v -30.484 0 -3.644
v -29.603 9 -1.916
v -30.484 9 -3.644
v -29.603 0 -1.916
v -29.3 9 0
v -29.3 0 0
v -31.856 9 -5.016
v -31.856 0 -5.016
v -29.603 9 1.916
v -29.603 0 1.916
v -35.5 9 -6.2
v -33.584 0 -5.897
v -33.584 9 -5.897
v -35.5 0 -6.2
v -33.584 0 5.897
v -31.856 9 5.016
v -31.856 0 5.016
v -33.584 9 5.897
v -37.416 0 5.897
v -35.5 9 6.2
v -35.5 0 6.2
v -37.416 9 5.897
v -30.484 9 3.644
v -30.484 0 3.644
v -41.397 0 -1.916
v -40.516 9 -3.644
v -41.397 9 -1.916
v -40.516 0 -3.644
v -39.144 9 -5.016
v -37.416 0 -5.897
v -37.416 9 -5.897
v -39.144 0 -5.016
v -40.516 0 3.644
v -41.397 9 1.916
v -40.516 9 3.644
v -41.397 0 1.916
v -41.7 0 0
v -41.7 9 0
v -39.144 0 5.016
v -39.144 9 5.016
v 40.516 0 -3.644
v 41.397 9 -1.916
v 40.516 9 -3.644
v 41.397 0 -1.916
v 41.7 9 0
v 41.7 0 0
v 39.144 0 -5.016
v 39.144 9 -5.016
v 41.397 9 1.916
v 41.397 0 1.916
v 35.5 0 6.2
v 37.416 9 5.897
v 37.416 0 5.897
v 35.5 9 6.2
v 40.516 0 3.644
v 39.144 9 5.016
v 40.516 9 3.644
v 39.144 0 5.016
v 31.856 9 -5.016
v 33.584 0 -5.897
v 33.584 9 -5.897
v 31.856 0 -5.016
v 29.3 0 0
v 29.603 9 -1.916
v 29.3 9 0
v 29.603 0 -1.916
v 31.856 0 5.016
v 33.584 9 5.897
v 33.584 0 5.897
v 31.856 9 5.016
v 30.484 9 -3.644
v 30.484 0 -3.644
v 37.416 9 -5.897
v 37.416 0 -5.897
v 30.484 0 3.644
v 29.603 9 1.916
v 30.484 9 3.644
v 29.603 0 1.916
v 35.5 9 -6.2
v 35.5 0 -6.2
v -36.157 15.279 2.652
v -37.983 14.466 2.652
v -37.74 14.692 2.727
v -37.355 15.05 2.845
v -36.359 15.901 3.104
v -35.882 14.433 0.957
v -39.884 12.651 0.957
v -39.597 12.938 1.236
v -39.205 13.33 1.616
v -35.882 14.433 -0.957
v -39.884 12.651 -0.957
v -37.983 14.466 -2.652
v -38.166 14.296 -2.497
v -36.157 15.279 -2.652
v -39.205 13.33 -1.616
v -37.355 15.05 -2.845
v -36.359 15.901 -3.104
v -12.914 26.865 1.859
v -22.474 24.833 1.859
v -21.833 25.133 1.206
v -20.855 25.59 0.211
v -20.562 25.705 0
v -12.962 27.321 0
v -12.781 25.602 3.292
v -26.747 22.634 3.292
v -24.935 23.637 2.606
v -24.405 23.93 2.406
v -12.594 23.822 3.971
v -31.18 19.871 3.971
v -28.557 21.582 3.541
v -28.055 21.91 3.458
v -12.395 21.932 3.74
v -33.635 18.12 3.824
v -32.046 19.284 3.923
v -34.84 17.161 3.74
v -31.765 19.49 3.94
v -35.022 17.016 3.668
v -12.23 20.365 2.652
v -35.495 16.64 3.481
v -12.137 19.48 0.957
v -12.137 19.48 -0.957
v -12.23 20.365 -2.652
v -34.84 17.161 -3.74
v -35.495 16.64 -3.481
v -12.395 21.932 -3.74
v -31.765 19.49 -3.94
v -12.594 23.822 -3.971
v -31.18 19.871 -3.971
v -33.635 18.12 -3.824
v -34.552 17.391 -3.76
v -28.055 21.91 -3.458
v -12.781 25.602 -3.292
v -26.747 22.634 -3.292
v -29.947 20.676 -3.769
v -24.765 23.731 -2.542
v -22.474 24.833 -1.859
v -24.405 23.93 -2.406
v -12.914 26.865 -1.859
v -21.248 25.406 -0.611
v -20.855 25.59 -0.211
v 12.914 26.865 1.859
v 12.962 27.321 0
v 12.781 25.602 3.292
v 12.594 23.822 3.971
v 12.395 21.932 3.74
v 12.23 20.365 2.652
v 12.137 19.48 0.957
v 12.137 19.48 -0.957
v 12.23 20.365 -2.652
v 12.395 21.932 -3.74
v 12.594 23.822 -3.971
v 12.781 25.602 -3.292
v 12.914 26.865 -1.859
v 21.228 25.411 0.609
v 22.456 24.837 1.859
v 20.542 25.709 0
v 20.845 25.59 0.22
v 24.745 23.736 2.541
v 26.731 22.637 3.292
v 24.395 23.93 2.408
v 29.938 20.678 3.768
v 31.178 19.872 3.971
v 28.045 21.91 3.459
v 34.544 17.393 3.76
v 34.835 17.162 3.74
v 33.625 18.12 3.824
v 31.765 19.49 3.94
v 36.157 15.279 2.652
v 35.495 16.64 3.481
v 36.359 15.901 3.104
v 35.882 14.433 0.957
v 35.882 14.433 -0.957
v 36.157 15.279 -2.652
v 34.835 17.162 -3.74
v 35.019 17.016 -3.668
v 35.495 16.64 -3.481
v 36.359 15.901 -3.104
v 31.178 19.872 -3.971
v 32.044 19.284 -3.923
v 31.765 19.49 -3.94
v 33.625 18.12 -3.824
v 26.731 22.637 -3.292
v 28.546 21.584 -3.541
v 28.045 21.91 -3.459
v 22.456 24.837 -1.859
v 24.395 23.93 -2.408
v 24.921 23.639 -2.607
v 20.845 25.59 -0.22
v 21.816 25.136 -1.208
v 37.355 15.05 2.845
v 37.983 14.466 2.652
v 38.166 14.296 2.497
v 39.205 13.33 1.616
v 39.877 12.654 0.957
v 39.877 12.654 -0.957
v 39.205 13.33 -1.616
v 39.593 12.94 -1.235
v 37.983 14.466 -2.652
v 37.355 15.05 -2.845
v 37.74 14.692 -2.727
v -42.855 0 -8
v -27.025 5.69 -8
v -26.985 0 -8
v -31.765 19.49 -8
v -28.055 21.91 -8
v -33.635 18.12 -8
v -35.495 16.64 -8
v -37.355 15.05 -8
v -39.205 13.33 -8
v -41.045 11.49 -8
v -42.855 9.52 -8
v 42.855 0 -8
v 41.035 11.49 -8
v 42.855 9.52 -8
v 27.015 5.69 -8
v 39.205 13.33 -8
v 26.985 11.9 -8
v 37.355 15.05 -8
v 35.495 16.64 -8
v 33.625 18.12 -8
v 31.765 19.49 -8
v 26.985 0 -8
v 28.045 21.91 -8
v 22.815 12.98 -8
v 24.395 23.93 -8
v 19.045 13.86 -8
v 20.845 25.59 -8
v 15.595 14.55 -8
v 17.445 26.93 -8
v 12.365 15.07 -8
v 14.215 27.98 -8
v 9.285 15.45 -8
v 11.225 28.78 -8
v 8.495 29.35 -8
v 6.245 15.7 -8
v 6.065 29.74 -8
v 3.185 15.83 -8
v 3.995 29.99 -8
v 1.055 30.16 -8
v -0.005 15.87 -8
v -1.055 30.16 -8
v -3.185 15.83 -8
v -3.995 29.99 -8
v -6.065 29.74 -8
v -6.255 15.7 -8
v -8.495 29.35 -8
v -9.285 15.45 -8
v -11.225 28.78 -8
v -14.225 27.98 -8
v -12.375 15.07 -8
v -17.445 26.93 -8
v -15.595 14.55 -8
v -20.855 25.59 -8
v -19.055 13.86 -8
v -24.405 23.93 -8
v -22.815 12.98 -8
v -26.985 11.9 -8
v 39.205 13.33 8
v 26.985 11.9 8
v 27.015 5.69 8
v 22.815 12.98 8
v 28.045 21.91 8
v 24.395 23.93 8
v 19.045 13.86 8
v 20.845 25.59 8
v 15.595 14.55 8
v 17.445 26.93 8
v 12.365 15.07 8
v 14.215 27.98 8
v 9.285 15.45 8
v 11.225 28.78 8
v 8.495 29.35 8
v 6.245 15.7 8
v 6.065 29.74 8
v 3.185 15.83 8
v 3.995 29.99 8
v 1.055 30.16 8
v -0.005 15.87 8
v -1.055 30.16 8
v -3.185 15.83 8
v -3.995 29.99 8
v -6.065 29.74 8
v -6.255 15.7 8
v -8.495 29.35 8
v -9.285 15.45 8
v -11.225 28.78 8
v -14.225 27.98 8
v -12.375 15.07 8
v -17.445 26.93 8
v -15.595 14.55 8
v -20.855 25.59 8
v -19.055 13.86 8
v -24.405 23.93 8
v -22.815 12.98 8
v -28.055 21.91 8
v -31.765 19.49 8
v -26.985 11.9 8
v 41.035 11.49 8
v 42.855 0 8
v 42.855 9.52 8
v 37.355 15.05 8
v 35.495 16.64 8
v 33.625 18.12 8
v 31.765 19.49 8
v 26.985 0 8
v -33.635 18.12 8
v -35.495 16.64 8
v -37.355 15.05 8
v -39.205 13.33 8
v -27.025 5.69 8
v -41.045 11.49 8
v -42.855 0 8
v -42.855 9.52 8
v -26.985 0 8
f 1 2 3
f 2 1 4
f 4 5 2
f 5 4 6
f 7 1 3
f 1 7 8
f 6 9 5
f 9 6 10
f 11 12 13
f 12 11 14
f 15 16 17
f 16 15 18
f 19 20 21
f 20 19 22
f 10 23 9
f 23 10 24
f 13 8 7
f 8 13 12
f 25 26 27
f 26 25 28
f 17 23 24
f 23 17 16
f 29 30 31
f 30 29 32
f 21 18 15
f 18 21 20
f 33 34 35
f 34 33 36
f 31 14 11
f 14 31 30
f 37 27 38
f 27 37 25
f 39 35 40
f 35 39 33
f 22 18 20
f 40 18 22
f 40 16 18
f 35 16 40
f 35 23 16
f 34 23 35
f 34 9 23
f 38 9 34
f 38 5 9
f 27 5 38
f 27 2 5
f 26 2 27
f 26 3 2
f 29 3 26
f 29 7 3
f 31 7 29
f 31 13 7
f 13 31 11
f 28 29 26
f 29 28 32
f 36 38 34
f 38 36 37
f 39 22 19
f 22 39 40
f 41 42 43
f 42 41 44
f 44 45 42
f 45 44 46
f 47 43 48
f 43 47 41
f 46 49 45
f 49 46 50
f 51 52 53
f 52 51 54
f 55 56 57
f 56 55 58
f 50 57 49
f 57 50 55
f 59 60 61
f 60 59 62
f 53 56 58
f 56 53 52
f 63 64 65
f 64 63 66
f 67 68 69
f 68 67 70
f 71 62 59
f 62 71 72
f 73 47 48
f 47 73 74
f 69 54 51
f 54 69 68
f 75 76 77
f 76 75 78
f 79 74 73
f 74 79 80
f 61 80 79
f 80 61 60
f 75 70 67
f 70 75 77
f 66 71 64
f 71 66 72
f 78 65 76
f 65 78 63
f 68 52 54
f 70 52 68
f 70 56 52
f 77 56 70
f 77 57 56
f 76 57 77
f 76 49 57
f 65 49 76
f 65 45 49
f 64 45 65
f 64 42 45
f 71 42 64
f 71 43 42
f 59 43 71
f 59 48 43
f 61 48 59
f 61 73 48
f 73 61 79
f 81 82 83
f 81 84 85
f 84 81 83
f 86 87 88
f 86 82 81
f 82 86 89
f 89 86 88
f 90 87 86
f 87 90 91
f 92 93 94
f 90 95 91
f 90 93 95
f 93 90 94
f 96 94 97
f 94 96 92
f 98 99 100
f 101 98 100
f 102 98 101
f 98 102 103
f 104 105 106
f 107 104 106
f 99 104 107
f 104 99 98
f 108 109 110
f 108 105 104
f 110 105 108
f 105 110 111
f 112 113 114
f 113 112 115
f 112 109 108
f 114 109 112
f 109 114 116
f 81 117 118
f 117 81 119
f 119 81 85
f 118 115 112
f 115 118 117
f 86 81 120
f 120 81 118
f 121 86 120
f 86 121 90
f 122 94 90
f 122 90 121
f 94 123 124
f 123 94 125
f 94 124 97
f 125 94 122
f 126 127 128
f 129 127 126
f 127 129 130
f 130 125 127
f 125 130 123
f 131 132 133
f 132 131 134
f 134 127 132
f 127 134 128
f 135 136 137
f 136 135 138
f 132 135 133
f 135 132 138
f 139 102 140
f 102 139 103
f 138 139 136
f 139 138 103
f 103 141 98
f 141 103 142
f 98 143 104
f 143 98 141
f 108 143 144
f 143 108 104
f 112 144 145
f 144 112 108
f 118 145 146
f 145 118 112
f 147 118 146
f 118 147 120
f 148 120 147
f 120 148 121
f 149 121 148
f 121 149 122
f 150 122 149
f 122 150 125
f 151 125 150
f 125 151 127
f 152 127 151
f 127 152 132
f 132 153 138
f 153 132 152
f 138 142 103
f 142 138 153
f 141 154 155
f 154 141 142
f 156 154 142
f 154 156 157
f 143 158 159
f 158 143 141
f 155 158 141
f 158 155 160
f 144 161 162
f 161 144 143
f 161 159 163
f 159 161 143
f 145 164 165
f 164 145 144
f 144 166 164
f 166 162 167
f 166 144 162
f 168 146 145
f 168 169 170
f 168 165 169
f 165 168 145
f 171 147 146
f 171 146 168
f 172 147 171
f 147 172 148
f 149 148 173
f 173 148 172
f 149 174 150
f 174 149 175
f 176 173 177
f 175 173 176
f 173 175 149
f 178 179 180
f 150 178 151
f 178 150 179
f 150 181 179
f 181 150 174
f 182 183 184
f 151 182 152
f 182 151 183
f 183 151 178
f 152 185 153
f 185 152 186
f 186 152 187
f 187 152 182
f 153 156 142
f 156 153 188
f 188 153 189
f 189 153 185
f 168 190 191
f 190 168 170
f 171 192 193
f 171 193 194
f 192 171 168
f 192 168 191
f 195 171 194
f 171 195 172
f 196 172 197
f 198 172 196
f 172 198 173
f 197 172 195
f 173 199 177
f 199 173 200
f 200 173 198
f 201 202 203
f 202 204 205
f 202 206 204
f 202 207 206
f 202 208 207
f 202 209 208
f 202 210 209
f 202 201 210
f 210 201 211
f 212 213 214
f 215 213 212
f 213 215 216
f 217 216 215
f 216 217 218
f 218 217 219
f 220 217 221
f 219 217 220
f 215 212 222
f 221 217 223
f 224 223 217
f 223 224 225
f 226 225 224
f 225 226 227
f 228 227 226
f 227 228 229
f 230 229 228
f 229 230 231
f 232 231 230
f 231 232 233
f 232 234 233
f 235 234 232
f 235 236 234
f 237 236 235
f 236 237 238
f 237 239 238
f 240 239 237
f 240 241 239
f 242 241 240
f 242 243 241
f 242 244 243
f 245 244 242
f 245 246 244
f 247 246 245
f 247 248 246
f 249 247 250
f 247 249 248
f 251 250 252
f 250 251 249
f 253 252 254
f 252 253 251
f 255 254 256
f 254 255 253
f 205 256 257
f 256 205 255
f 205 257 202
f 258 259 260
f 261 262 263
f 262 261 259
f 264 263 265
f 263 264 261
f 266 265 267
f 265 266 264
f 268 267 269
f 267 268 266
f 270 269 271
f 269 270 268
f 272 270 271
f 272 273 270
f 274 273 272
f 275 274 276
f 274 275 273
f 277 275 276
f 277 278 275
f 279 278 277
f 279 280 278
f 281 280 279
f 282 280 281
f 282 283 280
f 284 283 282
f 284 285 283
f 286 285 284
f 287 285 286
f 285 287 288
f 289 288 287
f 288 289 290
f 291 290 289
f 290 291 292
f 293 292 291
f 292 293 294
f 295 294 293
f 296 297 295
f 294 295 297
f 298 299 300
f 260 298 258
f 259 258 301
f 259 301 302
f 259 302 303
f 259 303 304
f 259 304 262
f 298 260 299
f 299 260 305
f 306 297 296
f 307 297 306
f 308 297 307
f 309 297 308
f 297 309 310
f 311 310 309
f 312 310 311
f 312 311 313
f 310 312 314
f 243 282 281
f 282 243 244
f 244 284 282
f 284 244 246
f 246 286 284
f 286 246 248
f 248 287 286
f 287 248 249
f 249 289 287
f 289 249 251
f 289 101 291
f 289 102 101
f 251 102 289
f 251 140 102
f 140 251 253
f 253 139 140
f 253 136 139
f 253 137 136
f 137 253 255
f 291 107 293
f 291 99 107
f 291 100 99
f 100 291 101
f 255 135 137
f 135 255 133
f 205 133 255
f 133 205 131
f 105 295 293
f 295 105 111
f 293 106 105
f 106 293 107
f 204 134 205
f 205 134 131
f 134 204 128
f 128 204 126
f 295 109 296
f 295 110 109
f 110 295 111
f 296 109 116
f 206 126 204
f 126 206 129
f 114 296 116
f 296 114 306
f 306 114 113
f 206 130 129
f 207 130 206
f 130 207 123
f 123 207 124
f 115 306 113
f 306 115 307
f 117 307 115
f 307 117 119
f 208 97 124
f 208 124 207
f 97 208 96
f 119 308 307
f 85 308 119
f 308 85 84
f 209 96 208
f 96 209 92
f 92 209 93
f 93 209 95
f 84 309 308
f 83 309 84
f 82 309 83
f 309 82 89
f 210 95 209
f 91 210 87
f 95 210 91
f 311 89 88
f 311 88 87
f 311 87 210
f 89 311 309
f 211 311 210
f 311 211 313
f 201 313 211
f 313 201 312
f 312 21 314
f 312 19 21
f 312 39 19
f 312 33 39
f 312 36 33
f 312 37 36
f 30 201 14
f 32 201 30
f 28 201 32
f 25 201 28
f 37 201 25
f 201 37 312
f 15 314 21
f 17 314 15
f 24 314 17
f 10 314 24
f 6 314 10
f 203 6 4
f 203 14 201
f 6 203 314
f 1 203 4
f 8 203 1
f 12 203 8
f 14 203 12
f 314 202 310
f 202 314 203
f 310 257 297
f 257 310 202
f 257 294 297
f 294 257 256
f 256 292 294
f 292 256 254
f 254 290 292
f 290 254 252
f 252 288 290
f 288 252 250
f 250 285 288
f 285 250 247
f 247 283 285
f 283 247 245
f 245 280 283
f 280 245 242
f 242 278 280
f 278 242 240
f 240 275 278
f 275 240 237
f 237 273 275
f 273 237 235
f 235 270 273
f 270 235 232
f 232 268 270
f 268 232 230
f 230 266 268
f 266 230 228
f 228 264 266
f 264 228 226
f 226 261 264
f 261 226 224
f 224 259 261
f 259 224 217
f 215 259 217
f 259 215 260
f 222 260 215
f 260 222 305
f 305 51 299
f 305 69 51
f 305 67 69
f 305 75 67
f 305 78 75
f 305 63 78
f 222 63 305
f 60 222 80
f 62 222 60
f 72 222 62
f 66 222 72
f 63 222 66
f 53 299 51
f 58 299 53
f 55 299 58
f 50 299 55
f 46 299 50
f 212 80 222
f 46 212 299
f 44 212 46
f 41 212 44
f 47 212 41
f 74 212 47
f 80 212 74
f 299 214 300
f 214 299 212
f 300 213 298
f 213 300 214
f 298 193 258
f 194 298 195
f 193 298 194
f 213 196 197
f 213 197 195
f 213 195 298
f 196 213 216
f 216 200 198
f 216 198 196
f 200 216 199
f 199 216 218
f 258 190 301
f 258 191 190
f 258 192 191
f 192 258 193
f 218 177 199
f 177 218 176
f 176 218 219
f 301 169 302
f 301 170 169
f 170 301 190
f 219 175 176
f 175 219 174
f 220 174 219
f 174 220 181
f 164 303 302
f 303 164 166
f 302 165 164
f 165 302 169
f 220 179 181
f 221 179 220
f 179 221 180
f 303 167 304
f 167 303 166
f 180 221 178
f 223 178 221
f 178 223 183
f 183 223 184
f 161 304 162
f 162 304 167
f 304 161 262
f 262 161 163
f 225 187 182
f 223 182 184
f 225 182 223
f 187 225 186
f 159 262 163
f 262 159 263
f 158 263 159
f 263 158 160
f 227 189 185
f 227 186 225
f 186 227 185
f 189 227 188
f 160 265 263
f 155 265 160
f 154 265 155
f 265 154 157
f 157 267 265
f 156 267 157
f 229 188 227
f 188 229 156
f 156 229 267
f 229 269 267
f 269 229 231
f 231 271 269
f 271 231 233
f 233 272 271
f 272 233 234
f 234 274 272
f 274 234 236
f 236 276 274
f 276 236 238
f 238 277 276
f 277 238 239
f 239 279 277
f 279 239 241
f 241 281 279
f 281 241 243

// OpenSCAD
// file: generated.scad
// Generated by "ink2scad" inkscape extension. http://nickthecoder.co.uk/software/view/ink2scad
//
// Names are based on the inkscape path's id. Use Shift+Ctrl++O in inkscape to edit the paths' ids.
// For each inkscape path, a variable is created, which defines the path. The data takes the form :
//
//     [ points, paths, [ox,oy], [width,height] ]
//
//     points         : An array of 2D coordinates. Passed to polygon's 'points' parameter.
//     paths          : An array of array of integers. Passed to polygon's 'paths' parameter.
//     [width,height] : The size of the path's bounding box.
//     [left,bottom]  : The position of the path's bottom left corner (When exporting more than one object).
//
// Example simple extrusions : :
//     linear_extrude( height = 10 ) ink2scad( myshape );
//

// Creates a 2D polygon from the data generated by the ink2scad inkscape plugin.
//
// data        : The definition of your shape (see header above for details)
// center      : If true, the polygon is create centered at (0,0)
// relative    : If true, the polygon is created at a position relative to the other generated objects 
// convexity   : Only used during openSCAD's preview mode
//
module ink2scad( data, center=false, relativeTo, convexity=4 )
{
    if ( center ) {
        translate( -data[2]/2 ) polygon( points=data[0], paths=data[1], convexity=convexity );
    } else {
        if ( relativeTo ) {
            translate( data[3] - relativeTo[3] ) polygon( points=data[0], paths=data[1], convexity=convexity );
        } else {
            polygon( points=data[0], paths=data[1], convexity=convexity );
        }
    }
}

//
// Example usage :
// linear_extrude( 10 ) ink2scad( myshape, center=true );
//

filamentGuideOpen = [
    [ [5.13,11.25], [7.12,13.05], [9.34,14.94], [12.14,17.17], [15.35,19.50], [18.80,21.69], [20.55,22.66], [22.30,23.51], [24.01,24.21], [25.68,24.71], [24.50,19.12], [23.98,16.41], [19.24,15.36], [14.35,14.12], [9.56,12.74],   [0,9.52], [0,0], [15.87,0], [15.83,5.69], [15.87,11.90], [20.04,12.98], [23.80,13.86], [27.26,14.55], [30.48,15.07], [33.57,15.45], [36.60,15.70], [39.67,15.83], [42.85,15.87], [42.85,30.16], [41.80,30.16], [38.86,29.99], [36.79,29.74], [34.36,29.35], [31.63,28.78], [28.63,27.98], [25.41,26.93], [22,25.59], [18.45,23.93], [14.80,21.91], [11.09,19.49], [9.22,18.12], [7.36,16.64], [5.50,15.05], [3.65,13.33], [1.81,11.49],   [80.58,11.25], [78.59,13.05], [76.37,14.94], [73.56,17.17], [70.35,19.50], [66.91,21.69], [65.16,22.66], [63.41,23.51], [61.69,24.21], [60.03,24.71], [61.21,19.12], [61.73,16.41], [66.47,15.36], [71.36,14.12], [76.15,12.74],   [85.71,9.52], [85.71,0], [69.84,0], [69.87,5.69], [69.84,11.90], [65.67,12.98], [61.90,13.86], [58.45,14.55], [55.22,15.07], [52.14,15.45], [49.10,15.70], [46.04,15.83], [42.85,15.87], [42.85,30.16], [43.91,30.16], [46.85,29.99], [48.92,29.74], [51.35,29.35], [54.08,28.78], [57.07,27.98], [60.30,26.93], [63.70,25.59], [67.25,23.93], [70.90,21.91], [74.62,19.49], [76.48,18.12], [78.35,16.64], [80.21,15.05], [82.06,13.33], [83.89,11.49] ],
    [ [0,1,2,3,4,5,6,7,8,9,10,11,12,13,14], [15,16,17,18,19,20,21,22,23,24,25,26,27,28,29,30,31,32,33,34,35,36,37,38,39,40,41,42,43,44], [59,58,57,56,55,54,53,52,51,50,49,48,47,46,45], [89,88,87,86,85,84,83,82,81,80,79,78,77,76,75,74,73,72,71,70,69,68,67,66,65,64,63,62,61,60] ],
    [85.71,30.16],
    [35.54,-162.19]
];


alice = [
    [ [25.06,2.59], [23.30,1.53], [20.83,1.60], [19.49,3.44], [19.21,8.09], [19.77,9.93], [21.39,10.92], [23.79,10.56], [24.85,9.29], [25.06,7.67], [23.37,7.32], [23.16,8.94], [22.10,9.14], [21.39,8.59], [21.04,7.18], [21.21,3.92], [21.91,3.19], [23.22,3.56], [24.21,4.53],   [0,0.14], [1.86,8.84], [5.35,10.02], [7.48,1.25], [5.31,0.96], [4.60,5.22], [3.37,5.10], [2.57,0.64],   [8.07,10.70], [9.23,1.46], [13.58,1.70], [13.61,3.96], [10.91,3.53], [10.48,11.02],   [14.68,11.41], [15.39,1.67], [17.93,1.74], [17.39,11.41],   [26.84,10.06], [26.83,1.14], [33.46,0], [33.07,2.85], [28.48,2.89], [28.48,4.89], [31.33,4.28], [31.26,5.89], [28.41,6.32], [28.27,8.31], [32.42,6.57], [32,8.53] ],
    [ [18,17,16,15,14,13,12,11,10,9,8,7,6,5,4,3,2,1,0], [26,25,24,23,22,21,20,19], [27,28,29,30,31,32], [33,34,35,36], [37,38,39,40,41,42,43,44,45,46,47,48] ],
    [33.46,11.41],
    [61.79,-179.08]
];


filamentGuide = [
    [ [0,9.52], [0,0], [15.87,0], [15.83,5.69], [15.87,11.90], [20.04,12.98], [23.80,13.86], [27.26,14.55], [30.48,15.07], [33.57,15.45], [36.60,15.70], [39.67,15.83], [42.85,15.87], [42.85,30.16], [41.80,30.16], [38.86,29.99], [36.79,29.74], [34.36,29.35], [31.63,28.78], [28.63,27.98], [25.41,26.93], [22,25.59], [18.45,23.93], [14.80,21.91], [11.09,19.49], [9.22,18.12], [7.36,16.64], [5.50,15.05], [3.65,13.33], [1.81,11.49],   [85.71,9.52], [85.71,0], [69.84,0], [69.87,5.69], [69.84,11.90], [65.67,12.98], [61.90,13.86], [58.45,14.55], [55.22,15.07], [52.14,15.45], [49.10,15.70], [46.04,15.83], [42.85,15.87], [42.85,30.16], [43.91,30.16], [46.85,29.99], [48.92,29.74], [51.35,29.35], [54.08,28.78], [57.07,27.98], [60.30,26.93], [63.70,25.59], [67.25,23.93], [70.90,21.91], [74.62,19.49], [76.48,18.12], [78.35,16.64], [80.21,15.05], [82.06,13.33], [83.89,11.49] ],
    [ [0,1,2,3,4,5,6,7,8,9,10,11,12,13,14,15,16,17,18,19,20,21,22,23,24,25,26,27,28,29], [59,58,57,56,55,54,53,52,51,50,49,48,47,46,45,44,43,42,41,40,39,38,37,36,35,34,33,32,31,30] ],
    [85.71,30.16],
    [35.54,-196.06]
];
// main file
include <generated.scad>;

postRadius = 6.2;
postDistance = 71;

module holes()
{
    for ( x=[-postDistance/2,postDistance/2] ) {
        translate( [x, -1, 0] )
        rotate( [-90,0,0] )
        cylinder( r=postRadius, h = 10 );
    };
    
    translate( [0,-96,0] ) rotate_extrude() translate( [120,0] ) circle(r=4);

}

module main(h)
{
    difference() {
        translate( [0,0, -h/2] ) translate( [ -filamentGuide[2][0]/2,0,0] ) linear_extrude( h, convexity=10 ) ink2scad( filamentGuide );
        holes();
    };
    
    %translate( [ -filamentGuide[2][0]/2,0,h/2] ) linear_extrude(1) ink2scad( alice, relativeTo=filamentGuide );
}

main(16);
